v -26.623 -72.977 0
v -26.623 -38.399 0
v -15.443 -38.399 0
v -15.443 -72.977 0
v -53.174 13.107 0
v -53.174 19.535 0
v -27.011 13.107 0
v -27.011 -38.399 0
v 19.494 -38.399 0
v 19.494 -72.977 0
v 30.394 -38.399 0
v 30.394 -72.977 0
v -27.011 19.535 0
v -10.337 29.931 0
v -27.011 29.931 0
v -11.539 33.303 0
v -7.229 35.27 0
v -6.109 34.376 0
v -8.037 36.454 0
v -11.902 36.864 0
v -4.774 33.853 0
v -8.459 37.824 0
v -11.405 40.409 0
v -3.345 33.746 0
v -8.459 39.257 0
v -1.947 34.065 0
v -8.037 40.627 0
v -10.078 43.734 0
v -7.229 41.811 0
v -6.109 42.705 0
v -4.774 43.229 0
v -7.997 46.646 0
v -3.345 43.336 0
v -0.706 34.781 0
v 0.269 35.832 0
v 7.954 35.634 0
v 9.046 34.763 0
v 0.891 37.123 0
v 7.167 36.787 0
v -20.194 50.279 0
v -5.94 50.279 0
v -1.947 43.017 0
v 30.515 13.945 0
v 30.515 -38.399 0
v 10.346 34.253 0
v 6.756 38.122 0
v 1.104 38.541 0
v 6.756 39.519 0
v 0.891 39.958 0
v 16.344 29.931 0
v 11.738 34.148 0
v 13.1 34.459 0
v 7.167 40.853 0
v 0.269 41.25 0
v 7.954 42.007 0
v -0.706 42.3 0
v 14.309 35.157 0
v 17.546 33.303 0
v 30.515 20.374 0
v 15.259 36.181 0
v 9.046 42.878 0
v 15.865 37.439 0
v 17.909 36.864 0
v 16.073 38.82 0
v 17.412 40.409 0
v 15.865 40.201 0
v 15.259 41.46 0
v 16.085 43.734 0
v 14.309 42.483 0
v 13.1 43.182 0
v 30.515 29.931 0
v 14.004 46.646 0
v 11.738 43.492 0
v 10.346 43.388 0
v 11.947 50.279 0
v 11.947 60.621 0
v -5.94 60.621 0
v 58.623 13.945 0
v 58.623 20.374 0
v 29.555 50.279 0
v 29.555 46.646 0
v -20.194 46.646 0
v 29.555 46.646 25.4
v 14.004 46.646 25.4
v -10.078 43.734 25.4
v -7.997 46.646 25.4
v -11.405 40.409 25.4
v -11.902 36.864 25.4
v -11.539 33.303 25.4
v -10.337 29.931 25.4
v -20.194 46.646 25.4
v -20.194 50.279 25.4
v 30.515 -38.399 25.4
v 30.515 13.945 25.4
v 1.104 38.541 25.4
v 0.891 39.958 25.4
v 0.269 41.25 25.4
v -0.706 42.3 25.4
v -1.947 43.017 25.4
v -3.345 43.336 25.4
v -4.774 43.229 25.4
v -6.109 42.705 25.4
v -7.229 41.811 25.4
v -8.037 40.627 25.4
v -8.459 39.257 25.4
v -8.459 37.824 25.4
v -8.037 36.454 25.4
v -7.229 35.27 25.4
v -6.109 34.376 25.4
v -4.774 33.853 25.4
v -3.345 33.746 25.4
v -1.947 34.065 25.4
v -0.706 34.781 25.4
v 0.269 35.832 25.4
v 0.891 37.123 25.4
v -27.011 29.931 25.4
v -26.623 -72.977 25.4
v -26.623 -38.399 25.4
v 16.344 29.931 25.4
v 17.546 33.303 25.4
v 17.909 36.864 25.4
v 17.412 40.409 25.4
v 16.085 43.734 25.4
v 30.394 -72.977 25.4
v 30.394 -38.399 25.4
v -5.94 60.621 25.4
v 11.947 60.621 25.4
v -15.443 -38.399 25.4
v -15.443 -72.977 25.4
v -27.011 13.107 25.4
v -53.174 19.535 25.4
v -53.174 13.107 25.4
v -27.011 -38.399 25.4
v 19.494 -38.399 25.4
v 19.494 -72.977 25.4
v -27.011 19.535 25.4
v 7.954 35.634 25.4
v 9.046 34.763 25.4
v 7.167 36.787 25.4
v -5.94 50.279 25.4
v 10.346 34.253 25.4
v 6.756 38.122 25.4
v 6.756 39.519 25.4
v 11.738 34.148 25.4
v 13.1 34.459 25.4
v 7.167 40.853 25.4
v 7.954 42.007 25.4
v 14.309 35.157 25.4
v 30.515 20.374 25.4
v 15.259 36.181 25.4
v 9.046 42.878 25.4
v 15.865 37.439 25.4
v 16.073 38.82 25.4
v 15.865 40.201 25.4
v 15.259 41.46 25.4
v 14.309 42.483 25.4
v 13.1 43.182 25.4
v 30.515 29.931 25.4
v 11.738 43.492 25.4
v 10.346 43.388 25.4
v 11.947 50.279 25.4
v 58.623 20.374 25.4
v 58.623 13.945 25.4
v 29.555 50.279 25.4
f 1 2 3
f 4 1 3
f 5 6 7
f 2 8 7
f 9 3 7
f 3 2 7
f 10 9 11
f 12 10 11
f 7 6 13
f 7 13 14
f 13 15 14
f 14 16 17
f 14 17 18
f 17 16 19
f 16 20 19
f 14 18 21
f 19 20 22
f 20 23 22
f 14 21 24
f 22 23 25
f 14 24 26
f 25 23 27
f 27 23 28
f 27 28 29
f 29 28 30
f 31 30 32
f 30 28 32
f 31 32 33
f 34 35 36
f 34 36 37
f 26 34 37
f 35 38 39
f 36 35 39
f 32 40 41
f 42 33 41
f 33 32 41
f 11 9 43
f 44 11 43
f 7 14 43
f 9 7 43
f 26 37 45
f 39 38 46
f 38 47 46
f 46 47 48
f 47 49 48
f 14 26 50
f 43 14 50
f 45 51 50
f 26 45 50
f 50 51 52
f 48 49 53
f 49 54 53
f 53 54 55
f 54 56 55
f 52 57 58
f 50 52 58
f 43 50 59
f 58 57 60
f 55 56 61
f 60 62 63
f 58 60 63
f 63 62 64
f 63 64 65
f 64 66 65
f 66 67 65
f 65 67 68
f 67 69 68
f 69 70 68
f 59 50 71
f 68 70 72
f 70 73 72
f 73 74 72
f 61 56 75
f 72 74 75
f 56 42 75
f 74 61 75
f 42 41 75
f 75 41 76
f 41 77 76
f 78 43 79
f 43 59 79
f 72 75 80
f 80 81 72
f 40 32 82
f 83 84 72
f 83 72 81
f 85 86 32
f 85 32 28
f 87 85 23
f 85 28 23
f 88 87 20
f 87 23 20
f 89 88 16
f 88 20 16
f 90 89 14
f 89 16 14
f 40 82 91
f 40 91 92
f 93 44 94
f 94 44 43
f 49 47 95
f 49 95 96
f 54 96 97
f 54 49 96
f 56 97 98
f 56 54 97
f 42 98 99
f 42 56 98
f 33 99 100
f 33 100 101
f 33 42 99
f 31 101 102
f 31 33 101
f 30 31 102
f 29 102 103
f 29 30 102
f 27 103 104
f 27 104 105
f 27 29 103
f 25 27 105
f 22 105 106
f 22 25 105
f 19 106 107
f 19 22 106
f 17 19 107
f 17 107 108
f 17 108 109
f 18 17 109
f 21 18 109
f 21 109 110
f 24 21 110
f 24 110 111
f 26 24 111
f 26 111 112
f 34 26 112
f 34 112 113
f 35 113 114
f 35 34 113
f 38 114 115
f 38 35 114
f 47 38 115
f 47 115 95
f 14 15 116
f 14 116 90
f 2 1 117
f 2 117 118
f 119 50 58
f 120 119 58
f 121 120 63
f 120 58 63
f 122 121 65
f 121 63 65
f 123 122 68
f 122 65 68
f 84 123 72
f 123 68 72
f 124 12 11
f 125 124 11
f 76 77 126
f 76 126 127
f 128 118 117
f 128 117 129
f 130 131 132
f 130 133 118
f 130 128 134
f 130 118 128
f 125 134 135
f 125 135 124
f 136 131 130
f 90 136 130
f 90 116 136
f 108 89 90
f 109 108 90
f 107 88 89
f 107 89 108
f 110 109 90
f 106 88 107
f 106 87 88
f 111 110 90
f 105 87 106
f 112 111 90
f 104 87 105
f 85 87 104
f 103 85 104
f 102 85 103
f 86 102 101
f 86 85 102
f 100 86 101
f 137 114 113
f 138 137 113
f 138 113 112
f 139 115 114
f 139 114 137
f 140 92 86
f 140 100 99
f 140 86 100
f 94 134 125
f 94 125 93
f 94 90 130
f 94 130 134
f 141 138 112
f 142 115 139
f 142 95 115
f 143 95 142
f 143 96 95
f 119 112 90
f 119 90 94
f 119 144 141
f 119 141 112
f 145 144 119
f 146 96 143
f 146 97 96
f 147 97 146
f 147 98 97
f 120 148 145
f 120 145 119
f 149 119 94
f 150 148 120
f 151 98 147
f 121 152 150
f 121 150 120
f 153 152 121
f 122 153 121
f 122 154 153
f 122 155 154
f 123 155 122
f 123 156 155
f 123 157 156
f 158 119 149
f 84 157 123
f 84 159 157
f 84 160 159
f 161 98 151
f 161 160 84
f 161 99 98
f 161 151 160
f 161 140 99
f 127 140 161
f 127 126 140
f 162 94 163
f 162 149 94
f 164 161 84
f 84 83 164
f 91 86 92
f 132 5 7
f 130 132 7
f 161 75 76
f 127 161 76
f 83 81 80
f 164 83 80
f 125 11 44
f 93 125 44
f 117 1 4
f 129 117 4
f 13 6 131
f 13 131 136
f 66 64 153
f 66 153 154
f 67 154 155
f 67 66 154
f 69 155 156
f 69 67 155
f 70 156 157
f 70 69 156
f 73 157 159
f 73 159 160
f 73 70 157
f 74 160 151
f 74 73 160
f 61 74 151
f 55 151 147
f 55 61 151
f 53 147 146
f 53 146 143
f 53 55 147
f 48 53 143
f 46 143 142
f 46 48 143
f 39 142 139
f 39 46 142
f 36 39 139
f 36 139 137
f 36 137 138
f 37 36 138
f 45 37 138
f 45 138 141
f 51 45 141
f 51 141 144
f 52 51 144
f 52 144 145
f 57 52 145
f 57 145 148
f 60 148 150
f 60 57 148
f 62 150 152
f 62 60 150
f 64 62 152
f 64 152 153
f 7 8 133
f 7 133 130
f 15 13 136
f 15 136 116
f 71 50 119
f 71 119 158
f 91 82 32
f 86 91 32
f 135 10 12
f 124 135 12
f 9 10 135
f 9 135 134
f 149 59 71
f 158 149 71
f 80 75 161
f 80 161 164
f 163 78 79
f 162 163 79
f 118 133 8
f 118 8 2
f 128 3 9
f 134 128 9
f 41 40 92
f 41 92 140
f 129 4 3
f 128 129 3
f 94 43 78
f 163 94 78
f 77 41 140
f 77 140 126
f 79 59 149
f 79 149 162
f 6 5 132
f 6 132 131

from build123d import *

# Parameters (mm, degrees)
F0_W      = 57.525436
F0_H      = 68.329709
F1_DEPTH  = 25.4
F2_R      = 14.907727
F3_DEPTH  = 25.4
F4_W      = 49.749678
F4_H      = 3.633402
F5_DEPTH  = 25.4
F6_W      = 17.887524
F6_H      = 13.415642
F7_DEPTH  = 25.4
F8_W      = 31.582661
F8_H      = 6.428329
F8_W_2    = 31.023681
F8_H_2    = 6.42833
F9_DEPTH  = 25.4
F10_W     = 10.900209
F10_H     = 34.936577
F10_W_2   = 11.179707
F10_H_2   = 35.216067
F11_DEPTH = 25.4
F12_R     = 4.685148
F12_R_2   = 4.808572
F13_DEPTH = 25.4


with BuildPart() as f1:
    # F0 (on Top) → F1 (new body)
    with BuildSketch(Plane.XY):
        with Locations((1.752042, -4.234104)):
            Rectangle(F0_W, F0_H)
    extrude(amount=F1_DEPTH)

    # F2 (on Top) → F3 (join)
    with BuildSketch(Plane.XY):
        with Locations((3.003552, 36.584344)):
            Circle(F2_R)
    extrude(amount=F3_DEPTH)

    # F4 (on Top) → F5 (join)
    with BuildSketch(Plane.XY):
        with Locations((4.68051, 48.462778)):
            Rectangle(F4_W, F4_H)
    extrude(amount=F5_DEPTH)

    # F6 (on Top) → F7 (join)
    with BuildSketch(Plane.XY):
        with Locations((3.003553, 53.912882)):
            Rectangle(F6_W, F6_H)
    extrude(amount=F7_DEPTH)

    # F8 (on Top) → F9 (join)
    with BuildSketch(Plane.XY):
        with Locations((42.831245, 17.159609)):
            Rectangle(F8_W, F8_H)
        with Locations((-37.662617, 16.321131)):
            Rectangle(F8_W_2, F8_H_2)
    extrude(amount=F9_DEPTH)

    # F10 (on Top) → F11 (join)
    with BuildSketch(Plane.XY):
        with Locations((24.943721, -55.508465)):
            Rectangle(F10_W, F10_H)
        with Locations((-21.032811, -55.368719)):
            Rectangle(F10_W_2, F10_H_2)
    extrude(amount=F11_DEPTH)

    # F12 (on Top) → F13 (cut)
    with BuildSketch(Plane.XY):
        with Locations((11.388331, 38.820285)):
            Circle(F12_R)
        with Locations((-3.704268, 38.540792)):
            Circle(F12_R_2)
    extrude(amount=F13_DEPTH, mode=Mode.SUBTRACT)


solid = f1.part
